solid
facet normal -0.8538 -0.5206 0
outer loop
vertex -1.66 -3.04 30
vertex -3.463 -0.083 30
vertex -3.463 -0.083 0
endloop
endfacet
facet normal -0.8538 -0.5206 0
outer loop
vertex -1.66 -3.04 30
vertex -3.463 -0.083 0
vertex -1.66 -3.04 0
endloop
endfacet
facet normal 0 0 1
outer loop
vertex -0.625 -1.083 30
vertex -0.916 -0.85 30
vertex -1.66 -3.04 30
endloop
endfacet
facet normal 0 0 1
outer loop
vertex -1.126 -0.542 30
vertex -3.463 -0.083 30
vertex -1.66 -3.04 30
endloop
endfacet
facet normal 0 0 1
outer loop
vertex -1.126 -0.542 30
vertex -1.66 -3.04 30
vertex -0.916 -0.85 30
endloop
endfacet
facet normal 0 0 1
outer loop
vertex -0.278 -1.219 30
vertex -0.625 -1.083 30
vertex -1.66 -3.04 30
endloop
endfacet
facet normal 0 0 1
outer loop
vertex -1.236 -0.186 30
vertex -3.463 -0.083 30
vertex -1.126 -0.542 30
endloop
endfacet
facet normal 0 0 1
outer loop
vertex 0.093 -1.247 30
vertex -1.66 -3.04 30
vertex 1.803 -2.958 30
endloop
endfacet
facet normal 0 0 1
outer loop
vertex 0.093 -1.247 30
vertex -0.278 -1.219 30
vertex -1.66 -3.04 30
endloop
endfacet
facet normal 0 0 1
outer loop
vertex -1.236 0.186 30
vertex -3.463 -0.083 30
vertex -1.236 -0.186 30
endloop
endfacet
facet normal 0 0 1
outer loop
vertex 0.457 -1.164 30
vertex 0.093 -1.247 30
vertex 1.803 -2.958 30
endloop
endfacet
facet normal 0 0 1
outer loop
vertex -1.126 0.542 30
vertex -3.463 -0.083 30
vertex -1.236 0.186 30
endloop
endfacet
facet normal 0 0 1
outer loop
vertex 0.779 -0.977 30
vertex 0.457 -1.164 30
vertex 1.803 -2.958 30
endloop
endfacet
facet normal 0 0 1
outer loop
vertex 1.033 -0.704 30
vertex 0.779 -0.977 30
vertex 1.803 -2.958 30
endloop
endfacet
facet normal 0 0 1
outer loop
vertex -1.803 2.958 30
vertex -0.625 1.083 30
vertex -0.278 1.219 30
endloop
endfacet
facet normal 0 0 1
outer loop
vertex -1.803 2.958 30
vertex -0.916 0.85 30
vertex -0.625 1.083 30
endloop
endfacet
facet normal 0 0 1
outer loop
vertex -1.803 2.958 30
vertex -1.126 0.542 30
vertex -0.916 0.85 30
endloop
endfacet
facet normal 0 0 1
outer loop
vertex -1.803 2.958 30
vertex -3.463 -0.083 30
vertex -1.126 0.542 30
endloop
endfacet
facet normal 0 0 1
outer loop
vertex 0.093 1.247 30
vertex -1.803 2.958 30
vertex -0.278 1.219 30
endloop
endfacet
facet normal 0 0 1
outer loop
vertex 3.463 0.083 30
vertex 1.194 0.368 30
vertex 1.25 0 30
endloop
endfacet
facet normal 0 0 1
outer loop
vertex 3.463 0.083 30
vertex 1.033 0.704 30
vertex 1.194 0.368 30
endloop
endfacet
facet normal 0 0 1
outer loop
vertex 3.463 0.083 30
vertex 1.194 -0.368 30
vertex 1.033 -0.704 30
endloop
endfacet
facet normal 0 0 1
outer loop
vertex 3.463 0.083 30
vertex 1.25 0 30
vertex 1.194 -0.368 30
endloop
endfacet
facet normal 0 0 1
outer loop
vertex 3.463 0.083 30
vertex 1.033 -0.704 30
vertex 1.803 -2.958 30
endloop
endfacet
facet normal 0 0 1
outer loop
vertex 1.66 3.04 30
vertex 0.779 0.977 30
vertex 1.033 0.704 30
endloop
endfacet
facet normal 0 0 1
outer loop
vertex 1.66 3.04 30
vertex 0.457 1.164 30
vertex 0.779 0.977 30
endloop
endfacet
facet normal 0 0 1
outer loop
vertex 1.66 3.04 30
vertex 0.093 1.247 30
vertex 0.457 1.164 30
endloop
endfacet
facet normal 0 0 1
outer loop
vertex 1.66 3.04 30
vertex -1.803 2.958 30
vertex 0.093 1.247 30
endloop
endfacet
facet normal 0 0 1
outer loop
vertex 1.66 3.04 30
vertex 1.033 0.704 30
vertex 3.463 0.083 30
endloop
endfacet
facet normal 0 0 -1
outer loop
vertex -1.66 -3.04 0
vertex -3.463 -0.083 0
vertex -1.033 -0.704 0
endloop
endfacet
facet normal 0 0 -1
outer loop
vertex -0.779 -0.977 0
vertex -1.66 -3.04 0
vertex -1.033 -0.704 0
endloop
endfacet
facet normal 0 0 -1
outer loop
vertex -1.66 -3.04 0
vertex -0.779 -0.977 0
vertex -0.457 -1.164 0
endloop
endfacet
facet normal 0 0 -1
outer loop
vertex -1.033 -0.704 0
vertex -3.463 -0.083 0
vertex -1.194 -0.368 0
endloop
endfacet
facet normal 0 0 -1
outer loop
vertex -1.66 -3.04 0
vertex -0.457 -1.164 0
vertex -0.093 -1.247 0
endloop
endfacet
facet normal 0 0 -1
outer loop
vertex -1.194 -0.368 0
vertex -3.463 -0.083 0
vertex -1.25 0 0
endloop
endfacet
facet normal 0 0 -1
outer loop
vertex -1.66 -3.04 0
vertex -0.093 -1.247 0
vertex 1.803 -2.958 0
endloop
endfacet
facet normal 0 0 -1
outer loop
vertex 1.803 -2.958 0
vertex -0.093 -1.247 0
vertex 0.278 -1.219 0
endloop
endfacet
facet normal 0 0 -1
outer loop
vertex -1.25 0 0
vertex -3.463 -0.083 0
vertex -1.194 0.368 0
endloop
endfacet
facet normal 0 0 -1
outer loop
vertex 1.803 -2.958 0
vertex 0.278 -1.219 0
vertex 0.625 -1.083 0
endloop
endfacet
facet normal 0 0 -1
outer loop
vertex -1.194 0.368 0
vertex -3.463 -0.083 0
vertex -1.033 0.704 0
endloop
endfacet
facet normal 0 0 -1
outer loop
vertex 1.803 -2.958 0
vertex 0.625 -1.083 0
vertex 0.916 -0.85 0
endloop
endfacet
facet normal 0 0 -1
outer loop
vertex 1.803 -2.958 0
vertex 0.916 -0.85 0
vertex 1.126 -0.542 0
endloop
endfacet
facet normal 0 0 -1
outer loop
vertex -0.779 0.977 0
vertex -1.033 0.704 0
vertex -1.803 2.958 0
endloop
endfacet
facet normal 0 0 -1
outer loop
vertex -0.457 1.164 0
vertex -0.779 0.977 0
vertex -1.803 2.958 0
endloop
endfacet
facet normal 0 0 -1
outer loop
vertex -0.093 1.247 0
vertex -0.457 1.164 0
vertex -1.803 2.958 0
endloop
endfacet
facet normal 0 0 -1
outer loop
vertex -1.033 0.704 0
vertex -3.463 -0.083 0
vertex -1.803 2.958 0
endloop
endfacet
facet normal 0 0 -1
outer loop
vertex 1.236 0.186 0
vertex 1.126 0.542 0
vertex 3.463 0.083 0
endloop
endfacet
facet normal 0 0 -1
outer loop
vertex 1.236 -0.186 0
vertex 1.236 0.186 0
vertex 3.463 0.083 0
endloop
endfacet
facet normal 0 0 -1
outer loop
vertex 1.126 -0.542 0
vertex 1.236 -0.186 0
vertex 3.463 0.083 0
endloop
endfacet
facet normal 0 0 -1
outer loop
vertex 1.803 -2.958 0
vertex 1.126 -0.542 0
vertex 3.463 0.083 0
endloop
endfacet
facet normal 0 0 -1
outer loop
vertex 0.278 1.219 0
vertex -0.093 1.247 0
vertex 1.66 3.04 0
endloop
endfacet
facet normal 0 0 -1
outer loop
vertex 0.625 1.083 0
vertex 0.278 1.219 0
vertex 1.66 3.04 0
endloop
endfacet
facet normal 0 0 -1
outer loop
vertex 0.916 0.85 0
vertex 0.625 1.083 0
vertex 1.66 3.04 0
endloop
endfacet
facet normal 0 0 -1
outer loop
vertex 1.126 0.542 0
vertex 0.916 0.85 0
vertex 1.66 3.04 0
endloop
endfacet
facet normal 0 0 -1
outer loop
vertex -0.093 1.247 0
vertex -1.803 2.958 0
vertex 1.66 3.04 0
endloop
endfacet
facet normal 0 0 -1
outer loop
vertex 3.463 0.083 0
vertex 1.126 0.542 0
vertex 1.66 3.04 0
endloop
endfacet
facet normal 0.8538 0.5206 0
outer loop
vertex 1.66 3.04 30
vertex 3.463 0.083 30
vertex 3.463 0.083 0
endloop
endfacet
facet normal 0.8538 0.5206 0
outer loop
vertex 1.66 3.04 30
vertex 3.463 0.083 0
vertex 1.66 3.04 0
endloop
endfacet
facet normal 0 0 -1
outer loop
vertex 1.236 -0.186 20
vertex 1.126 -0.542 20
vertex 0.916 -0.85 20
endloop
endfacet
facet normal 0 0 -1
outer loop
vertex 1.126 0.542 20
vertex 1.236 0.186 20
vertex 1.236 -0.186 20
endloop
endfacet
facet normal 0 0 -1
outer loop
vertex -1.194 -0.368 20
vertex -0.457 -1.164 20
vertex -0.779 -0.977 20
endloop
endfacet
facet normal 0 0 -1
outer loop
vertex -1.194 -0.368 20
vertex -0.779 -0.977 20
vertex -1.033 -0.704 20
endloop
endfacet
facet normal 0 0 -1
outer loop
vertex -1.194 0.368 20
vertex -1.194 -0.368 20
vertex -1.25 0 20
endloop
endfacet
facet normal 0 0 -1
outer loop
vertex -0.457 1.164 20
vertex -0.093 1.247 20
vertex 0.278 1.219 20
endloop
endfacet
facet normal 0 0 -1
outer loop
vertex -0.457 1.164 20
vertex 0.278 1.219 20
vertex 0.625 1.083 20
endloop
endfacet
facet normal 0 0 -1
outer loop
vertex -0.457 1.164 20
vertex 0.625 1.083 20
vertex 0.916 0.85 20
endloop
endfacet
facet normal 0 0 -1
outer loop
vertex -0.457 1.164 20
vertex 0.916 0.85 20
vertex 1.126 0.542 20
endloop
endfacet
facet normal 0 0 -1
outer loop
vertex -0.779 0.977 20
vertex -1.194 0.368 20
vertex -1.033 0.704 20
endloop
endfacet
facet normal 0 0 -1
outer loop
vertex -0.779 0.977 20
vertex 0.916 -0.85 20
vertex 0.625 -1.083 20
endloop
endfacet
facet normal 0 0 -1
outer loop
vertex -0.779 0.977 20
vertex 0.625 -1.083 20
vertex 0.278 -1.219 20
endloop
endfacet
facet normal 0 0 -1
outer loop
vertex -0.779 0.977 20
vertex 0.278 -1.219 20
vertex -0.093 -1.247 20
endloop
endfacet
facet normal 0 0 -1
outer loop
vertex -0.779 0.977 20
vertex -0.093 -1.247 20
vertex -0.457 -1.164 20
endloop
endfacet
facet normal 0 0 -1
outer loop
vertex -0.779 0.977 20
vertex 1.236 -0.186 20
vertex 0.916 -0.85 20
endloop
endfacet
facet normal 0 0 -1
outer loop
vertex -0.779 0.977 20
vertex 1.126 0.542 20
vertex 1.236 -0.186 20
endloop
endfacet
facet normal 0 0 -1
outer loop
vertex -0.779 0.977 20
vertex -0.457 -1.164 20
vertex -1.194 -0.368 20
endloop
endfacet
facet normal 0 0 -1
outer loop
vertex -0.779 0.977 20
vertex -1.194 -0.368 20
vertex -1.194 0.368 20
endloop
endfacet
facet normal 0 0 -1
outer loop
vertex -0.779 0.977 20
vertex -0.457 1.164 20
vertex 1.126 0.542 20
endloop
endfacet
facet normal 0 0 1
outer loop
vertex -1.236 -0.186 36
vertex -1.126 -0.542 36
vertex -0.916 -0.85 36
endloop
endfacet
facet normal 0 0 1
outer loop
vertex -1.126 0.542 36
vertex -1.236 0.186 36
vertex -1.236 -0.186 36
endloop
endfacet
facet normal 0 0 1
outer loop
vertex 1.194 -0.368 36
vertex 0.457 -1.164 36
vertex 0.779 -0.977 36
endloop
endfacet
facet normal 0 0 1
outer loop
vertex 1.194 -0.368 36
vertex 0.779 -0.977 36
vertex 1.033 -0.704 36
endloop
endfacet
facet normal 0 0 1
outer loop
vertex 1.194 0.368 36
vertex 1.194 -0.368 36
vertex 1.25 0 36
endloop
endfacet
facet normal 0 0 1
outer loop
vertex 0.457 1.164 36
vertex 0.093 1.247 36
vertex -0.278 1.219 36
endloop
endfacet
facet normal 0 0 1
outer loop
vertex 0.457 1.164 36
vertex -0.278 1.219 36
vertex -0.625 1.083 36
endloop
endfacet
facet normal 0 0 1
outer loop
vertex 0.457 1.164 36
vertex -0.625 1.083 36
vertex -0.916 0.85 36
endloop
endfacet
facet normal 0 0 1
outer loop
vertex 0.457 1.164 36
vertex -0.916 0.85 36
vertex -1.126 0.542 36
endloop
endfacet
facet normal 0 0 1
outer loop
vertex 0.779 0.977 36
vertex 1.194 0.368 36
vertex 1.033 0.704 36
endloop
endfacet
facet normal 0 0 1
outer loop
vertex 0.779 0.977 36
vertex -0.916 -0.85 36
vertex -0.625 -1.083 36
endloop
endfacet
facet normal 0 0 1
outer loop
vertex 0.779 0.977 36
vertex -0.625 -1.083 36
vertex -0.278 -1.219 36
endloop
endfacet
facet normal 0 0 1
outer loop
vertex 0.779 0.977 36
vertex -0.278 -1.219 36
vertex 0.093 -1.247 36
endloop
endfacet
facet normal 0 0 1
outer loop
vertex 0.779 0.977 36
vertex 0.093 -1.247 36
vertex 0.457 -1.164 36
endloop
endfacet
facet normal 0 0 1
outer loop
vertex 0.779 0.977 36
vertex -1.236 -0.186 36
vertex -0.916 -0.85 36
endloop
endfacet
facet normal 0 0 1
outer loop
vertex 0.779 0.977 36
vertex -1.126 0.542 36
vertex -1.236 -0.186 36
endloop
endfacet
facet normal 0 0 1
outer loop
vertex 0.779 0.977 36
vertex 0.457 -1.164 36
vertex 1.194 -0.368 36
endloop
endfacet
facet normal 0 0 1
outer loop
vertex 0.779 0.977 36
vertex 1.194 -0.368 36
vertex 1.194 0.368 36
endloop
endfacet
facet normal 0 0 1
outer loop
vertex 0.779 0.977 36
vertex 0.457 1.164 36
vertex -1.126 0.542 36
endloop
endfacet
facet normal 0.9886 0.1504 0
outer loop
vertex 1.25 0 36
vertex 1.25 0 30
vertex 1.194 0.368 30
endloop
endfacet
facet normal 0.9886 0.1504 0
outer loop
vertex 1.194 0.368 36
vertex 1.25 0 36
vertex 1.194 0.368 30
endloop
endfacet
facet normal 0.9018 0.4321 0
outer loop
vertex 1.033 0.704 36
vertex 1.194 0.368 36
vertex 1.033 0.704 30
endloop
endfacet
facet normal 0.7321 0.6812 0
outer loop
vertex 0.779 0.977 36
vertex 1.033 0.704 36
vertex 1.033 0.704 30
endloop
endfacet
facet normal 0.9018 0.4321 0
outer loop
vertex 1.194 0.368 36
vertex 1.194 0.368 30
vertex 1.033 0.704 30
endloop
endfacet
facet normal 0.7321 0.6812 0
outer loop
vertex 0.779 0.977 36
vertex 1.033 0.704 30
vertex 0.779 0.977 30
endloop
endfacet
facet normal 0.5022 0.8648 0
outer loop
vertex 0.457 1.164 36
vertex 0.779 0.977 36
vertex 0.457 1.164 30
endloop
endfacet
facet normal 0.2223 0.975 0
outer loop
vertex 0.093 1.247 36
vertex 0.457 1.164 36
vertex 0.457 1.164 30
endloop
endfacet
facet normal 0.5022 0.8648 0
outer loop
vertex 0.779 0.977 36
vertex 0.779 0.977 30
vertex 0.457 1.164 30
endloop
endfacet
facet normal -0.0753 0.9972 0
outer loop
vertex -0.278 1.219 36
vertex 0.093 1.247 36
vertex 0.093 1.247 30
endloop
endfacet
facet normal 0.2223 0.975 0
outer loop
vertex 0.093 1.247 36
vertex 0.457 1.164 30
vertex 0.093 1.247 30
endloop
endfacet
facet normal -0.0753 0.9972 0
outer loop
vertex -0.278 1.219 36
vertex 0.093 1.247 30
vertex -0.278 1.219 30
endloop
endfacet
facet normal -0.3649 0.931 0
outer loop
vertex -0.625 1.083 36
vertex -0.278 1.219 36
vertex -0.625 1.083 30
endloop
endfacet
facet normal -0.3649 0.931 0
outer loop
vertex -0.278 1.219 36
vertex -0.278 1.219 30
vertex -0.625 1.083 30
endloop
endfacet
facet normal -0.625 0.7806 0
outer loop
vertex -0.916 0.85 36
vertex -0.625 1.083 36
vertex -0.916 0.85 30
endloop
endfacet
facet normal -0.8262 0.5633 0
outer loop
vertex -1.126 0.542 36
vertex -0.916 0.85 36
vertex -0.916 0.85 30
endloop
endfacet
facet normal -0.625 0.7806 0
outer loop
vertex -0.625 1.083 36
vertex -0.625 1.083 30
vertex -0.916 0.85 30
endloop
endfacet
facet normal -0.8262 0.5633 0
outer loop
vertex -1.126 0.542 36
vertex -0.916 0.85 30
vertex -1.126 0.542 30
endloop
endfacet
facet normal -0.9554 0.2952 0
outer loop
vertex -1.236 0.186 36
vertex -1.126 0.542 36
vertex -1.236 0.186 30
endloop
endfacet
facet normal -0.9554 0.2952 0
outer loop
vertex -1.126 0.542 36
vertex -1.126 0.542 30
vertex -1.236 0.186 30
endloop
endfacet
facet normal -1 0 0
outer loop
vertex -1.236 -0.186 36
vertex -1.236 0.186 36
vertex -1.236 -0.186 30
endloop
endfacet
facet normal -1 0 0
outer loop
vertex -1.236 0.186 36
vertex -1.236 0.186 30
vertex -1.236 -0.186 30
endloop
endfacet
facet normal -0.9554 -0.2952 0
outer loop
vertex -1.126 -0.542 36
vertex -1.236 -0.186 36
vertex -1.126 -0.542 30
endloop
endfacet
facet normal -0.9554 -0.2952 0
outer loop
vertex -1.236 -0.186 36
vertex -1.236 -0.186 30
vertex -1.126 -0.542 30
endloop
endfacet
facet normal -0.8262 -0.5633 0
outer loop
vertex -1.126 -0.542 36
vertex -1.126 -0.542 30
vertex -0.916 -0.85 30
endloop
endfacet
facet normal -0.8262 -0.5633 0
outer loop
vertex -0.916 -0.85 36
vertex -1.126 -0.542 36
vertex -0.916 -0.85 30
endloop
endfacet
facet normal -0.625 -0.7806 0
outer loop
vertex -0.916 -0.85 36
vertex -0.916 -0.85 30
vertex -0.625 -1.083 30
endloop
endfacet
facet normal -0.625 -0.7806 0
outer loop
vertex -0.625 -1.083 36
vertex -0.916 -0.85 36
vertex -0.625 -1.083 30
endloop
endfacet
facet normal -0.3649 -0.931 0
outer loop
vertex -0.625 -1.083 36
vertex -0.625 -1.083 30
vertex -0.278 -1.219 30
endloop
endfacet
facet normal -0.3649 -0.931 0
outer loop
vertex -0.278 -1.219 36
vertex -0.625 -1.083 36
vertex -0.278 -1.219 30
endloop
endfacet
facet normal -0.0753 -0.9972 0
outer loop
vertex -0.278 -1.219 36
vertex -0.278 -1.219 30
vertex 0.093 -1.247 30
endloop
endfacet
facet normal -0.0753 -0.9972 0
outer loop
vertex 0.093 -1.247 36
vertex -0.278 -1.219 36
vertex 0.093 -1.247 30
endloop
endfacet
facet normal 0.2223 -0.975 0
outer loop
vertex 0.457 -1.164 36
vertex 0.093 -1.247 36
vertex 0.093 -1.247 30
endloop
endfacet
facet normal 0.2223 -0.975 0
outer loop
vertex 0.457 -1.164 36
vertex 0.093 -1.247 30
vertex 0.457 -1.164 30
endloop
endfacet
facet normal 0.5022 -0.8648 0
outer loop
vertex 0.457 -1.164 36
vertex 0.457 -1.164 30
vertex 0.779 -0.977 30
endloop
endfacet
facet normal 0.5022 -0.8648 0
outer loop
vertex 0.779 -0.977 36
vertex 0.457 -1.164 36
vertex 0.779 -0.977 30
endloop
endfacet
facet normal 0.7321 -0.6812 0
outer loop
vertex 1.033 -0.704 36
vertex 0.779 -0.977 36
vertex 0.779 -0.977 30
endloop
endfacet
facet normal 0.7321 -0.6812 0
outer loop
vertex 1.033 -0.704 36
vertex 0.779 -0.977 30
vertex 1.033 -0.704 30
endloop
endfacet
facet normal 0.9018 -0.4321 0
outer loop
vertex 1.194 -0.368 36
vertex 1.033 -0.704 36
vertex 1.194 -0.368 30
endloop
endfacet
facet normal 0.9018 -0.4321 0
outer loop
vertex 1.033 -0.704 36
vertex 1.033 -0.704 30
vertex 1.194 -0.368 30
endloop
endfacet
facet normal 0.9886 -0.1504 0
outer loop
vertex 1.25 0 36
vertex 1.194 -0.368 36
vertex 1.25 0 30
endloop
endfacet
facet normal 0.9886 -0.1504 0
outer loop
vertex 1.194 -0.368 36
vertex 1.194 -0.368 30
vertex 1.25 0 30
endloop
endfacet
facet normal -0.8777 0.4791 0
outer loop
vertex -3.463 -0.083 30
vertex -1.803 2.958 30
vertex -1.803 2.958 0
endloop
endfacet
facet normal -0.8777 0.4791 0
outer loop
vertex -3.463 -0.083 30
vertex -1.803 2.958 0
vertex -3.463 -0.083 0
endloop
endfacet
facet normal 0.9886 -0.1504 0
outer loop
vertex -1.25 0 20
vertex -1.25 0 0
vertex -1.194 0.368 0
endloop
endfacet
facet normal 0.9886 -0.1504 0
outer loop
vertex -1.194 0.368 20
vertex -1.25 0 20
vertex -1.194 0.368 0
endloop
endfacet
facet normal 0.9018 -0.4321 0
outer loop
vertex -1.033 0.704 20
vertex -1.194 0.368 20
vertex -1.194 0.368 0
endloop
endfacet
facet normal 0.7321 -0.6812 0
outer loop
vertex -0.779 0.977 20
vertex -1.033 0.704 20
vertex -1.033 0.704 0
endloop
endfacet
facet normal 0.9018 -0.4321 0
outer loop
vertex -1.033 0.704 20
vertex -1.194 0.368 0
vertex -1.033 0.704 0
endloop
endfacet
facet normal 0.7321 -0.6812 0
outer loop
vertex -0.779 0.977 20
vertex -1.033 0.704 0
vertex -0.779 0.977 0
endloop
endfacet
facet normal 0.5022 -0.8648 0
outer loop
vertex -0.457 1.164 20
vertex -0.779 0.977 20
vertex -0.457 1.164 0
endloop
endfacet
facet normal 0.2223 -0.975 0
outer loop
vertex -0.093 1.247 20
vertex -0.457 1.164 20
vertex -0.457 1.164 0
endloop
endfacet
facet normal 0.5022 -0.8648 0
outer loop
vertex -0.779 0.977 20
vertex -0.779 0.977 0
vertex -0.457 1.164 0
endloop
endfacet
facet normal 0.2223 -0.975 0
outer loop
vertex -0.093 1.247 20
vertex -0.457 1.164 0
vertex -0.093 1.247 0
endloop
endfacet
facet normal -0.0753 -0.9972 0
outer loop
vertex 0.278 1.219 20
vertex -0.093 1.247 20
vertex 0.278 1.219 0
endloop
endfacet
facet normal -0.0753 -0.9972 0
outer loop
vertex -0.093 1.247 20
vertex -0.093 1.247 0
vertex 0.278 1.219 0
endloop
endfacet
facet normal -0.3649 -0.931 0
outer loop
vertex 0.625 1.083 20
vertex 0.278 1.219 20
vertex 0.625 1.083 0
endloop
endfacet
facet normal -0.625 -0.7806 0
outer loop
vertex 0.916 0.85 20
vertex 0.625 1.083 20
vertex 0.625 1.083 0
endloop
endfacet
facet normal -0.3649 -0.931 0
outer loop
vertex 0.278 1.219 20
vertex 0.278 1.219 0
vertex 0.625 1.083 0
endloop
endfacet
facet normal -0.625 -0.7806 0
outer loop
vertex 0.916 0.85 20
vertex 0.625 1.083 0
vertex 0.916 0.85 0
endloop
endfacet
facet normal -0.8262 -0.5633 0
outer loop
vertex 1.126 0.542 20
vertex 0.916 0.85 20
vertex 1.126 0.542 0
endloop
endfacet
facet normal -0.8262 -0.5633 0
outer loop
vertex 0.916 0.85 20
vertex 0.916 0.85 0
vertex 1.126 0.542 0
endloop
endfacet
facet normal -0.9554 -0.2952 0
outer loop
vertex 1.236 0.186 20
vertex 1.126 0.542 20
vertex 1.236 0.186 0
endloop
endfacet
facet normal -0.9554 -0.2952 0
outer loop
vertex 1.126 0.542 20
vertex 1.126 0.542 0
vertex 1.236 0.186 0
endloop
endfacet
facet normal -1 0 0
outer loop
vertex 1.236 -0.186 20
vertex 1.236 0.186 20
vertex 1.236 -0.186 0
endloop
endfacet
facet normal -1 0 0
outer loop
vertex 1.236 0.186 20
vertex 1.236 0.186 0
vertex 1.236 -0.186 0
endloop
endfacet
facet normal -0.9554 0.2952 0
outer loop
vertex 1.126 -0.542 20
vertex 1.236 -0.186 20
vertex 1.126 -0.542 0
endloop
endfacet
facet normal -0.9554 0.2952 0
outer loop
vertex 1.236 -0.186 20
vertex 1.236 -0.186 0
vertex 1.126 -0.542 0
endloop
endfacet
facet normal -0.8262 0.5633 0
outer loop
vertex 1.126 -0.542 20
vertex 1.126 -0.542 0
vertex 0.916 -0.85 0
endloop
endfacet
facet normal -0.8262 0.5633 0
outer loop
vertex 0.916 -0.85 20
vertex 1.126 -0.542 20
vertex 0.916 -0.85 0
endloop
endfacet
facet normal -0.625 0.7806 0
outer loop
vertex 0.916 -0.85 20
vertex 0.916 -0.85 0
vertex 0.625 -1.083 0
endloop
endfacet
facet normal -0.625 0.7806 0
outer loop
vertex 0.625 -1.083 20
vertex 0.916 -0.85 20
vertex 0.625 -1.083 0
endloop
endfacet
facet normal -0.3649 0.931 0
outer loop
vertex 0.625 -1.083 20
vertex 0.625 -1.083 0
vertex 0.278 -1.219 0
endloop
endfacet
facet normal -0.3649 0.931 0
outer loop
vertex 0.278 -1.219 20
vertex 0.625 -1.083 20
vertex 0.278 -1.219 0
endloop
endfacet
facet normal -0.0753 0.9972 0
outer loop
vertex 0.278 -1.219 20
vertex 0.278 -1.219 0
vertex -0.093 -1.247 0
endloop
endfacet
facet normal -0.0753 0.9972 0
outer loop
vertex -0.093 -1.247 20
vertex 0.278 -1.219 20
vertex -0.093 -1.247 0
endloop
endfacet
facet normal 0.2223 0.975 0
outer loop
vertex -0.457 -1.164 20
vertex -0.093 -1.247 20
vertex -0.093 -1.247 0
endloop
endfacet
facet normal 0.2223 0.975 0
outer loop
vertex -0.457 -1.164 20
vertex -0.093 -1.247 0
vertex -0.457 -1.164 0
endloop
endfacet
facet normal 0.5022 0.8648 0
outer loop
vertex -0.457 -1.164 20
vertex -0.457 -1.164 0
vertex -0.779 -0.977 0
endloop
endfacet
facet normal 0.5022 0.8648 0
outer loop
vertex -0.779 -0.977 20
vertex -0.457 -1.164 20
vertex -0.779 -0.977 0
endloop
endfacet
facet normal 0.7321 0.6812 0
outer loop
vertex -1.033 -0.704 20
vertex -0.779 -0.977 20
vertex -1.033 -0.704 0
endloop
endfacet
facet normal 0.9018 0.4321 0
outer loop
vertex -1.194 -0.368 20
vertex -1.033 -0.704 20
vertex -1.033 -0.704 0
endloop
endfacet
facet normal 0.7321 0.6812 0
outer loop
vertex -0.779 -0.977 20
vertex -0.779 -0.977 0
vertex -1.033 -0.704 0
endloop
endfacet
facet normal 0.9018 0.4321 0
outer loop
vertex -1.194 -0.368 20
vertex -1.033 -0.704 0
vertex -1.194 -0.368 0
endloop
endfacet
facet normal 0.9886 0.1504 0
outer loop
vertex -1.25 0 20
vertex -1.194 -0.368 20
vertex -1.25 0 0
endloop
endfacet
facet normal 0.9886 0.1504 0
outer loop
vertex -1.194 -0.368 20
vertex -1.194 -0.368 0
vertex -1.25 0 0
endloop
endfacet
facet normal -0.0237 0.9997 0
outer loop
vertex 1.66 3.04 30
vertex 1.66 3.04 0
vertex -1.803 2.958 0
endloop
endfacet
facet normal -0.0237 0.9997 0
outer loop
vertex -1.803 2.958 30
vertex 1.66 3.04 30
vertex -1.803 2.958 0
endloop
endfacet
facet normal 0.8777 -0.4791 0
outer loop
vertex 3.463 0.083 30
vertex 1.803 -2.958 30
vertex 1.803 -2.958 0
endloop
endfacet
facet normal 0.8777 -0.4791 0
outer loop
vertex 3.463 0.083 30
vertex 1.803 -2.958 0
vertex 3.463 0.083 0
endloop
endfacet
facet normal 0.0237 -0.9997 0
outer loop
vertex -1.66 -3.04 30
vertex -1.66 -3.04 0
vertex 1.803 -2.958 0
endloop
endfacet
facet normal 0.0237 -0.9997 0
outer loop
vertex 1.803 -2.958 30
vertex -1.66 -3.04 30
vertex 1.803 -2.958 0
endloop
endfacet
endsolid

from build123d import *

# Parameters (mm, degrees)
EXTRUDE_1_DEPTH     = 30
SKETCH_2_R          = 1.25
EXTRUDE_2_DEPTH     = 6
SKETCH_3_R          = 1.25
CUT_EXTRUDE_1_DEPTH = 20


with BuildPart() as part:
    # 草图1 → 凸台-拉伸1 (new body)
    with BuildSketch(Plane.XY):
        Polygon((1.659979091, 3.040471907), (-1.803136365, 2.957820016), (-3.463115456, -0.082651891), (-1.659979091, -3.040471907), (1.803136365, -2.957820016), (3.463115456, 0.082651891), align=None)
    extrude(amount=EXTRUDE_1_DEPTH)

    # 草图2 → 凸台-拉伸2 (add)
    with BuildSketch(Plane.XY.offset(30)):
        Circle(SKETCH_2_R)
    extrude(amount=EXTRUDE_2_DEPTH)

    # 草图3 → 切除-拉伸1 (cut)
    with BuildSketch(Plane(origin=(0, 0, 0), x_dir=(-1, 0, 0), z_dir=(0, 0, -1))):
        Circle(SKETCH_3_R)
    extrude(amount=-CUT_EXTRUDE_1_DEPTH, mode=Mode.SUBTRACT)


solid = part.part
